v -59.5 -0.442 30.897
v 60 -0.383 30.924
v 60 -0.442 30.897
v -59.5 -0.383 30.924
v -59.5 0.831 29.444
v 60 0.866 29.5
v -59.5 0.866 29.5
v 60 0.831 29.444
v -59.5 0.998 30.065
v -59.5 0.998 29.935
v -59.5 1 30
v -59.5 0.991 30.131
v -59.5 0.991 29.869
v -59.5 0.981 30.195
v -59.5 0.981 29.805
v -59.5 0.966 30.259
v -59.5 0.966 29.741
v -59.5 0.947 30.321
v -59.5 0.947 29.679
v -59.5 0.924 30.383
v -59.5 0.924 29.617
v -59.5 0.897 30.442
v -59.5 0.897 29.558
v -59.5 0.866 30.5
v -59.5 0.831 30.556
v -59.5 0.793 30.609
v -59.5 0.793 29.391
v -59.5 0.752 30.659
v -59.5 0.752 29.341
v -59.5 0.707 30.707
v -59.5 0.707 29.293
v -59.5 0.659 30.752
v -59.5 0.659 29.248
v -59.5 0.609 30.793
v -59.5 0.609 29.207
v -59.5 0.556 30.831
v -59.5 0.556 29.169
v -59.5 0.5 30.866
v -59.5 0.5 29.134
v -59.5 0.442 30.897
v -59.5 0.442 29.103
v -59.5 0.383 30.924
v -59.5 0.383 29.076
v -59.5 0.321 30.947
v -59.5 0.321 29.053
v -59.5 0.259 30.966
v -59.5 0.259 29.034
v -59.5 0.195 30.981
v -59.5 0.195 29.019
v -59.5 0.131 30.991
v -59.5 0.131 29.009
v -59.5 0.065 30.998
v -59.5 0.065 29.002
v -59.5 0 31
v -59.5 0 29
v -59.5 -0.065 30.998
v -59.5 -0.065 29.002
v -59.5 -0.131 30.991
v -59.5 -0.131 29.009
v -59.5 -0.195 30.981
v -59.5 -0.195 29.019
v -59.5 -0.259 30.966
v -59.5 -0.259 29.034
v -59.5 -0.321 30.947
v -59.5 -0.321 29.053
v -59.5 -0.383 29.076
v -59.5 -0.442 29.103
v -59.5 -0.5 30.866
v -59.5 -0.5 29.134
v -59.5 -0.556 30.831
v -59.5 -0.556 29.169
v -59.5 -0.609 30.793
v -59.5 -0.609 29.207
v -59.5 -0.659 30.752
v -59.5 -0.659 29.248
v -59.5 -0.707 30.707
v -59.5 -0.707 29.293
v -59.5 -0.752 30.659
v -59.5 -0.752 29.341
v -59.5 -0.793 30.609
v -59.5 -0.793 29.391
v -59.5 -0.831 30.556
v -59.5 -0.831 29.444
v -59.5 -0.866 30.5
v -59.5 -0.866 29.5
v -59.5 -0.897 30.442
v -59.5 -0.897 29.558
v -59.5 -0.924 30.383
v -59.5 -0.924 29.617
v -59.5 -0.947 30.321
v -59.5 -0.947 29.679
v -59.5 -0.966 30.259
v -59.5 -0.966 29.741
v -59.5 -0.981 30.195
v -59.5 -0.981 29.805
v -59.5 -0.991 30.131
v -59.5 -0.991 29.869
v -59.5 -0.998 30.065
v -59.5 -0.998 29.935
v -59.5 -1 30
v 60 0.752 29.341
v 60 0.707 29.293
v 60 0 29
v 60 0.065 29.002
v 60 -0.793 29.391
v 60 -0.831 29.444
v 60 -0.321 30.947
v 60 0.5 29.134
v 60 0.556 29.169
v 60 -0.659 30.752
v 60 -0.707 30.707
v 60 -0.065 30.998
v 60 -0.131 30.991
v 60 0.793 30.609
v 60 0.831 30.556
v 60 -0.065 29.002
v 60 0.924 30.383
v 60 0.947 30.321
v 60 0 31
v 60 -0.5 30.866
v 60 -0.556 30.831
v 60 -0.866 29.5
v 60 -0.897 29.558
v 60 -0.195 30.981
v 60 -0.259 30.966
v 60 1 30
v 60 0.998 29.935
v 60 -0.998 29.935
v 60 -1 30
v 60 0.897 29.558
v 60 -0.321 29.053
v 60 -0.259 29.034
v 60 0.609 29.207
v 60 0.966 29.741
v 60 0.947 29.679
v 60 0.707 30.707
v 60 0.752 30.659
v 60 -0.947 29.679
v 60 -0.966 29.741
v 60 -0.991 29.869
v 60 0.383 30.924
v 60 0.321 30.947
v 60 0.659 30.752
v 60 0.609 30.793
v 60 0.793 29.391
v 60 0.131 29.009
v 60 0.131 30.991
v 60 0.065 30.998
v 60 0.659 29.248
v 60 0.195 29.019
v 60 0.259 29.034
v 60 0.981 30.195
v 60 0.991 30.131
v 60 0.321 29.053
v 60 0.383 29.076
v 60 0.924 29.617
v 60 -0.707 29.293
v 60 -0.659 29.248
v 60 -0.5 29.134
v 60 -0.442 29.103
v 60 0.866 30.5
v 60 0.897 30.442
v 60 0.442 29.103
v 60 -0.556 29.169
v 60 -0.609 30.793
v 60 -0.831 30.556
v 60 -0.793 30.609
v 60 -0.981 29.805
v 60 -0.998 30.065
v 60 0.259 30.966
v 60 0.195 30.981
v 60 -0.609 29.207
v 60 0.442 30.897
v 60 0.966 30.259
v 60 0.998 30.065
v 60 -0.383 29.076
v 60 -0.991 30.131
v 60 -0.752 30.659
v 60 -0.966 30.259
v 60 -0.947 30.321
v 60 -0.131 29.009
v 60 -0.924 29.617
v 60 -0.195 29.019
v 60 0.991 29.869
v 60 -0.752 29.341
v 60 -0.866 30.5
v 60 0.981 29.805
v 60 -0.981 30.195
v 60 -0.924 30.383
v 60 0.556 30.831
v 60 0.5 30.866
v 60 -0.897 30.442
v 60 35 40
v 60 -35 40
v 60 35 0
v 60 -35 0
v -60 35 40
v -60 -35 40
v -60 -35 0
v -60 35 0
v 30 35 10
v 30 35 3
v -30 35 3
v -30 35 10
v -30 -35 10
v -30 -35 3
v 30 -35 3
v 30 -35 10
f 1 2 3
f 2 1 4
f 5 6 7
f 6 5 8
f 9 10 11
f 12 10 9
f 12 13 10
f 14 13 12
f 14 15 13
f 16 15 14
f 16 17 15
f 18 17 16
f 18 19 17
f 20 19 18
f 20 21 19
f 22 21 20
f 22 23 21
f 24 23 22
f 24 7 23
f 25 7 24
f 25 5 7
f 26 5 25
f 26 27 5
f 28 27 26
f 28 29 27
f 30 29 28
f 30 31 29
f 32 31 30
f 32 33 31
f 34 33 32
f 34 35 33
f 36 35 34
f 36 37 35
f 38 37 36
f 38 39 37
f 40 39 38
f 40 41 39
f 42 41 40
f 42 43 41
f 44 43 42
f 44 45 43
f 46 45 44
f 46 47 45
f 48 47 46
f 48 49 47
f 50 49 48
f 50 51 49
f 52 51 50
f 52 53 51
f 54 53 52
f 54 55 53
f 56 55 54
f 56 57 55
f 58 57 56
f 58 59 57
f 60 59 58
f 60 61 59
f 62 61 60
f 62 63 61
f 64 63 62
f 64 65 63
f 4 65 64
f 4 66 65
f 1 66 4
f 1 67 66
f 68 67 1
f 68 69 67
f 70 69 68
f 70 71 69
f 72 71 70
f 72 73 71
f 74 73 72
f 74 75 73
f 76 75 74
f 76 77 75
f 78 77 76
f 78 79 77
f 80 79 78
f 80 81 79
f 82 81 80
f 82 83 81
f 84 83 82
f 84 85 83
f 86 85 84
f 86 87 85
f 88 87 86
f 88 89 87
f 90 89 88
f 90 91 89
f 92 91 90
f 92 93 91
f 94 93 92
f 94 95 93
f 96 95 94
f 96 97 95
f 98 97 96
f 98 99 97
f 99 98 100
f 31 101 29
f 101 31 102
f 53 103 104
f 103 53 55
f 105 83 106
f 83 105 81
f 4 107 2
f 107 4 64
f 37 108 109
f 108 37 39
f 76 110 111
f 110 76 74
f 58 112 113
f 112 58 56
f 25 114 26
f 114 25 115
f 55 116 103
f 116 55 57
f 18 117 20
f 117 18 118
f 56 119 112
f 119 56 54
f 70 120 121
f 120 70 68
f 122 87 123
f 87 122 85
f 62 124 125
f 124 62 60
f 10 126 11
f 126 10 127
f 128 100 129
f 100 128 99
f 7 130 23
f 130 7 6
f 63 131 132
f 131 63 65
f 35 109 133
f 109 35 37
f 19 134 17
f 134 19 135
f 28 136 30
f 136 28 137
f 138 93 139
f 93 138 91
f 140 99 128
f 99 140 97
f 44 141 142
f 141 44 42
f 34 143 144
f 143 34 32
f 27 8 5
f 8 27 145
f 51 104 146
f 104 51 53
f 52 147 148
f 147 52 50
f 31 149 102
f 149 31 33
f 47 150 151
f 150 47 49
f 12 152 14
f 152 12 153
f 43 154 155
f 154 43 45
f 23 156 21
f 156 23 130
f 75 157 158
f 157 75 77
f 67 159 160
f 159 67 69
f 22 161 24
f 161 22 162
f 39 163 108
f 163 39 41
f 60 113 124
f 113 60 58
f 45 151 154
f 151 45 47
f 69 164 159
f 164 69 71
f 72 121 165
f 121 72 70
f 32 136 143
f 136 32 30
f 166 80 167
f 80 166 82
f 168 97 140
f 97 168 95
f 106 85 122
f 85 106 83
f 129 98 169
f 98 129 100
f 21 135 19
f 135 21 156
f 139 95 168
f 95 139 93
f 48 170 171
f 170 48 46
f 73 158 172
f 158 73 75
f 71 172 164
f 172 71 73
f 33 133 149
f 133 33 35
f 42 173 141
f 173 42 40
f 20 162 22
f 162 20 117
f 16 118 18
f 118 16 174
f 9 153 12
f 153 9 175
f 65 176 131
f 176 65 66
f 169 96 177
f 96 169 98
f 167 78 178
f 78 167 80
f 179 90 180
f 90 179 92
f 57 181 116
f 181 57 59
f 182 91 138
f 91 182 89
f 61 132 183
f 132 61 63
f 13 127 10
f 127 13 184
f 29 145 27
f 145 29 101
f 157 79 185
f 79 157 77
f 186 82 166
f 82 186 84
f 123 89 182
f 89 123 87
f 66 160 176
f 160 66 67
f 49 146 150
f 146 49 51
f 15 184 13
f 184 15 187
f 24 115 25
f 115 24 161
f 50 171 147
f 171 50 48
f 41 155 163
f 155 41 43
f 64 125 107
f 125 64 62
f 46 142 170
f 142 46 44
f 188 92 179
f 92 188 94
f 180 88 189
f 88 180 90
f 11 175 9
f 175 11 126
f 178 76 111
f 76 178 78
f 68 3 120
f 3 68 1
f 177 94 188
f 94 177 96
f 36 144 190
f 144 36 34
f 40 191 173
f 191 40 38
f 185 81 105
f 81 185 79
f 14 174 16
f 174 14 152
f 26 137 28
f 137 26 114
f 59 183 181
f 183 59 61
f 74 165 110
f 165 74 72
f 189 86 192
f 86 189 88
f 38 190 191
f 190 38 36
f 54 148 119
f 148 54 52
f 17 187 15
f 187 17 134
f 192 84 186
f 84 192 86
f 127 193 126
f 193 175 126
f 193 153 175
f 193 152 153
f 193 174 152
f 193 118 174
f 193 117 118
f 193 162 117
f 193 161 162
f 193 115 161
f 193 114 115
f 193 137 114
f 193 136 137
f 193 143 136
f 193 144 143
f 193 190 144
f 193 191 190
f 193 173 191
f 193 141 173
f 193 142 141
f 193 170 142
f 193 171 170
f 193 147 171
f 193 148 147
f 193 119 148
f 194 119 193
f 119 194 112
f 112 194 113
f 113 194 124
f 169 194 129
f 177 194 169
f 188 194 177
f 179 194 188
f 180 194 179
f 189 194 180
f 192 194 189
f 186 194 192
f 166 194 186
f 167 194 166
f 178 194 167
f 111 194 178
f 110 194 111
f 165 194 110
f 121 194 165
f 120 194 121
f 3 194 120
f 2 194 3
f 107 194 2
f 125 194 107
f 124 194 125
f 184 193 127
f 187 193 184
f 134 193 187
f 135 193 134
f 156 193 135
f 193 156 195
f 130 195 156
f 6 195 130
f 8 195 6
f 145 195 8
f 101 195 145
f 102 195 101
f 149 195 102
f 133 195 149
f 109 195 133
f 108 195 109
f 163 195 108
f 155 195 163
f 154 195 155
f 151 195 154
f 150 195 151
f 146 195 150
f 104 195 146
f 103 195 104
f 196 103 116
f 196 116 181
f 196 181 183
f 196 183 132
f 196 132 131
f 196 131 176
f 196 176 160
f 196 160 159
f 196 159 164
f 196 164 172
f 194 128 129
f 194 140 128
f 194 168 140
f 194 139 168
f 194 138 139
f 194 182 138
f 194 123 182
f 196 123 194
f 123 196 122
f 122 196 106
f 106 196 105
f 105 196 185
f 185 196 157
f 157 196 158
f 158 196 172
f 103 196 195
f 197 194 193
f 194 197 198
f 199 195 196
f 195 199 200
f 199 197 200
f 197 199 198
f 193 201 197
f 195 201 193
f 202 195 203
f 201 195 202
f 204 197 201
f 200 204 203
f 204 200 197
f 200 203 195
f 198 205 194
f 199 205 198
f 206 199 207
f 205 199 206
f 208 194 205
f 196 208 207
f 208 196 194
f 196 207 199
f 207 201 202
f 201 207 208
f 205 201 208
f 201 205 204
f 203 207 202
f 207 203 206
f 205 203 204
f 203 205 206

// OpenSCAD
// Mini horizontal gel-electrophoresis box - buffer tank
// Print orientation: open top facing up, resting on XY plane at z = 0

// ---------------- Parameters ----------------
tank_x      = 120;   // outer length in X
tank_y      = 70;    // outer width in Y
tank_h      = 40;    // outer height in Z

wall        = 3;     // wall thickness
floor       = 3;     // floor thickness under tank

platform_x  = 60;    // platform length in X (centred)
platform_y  = tank_y; // platform spans full inner width
platform_top = 10;   // platform top height above tank floor (z = 13)

hole_d      = 2;     // electrode hole diameter
hole_y      = 0;     // electrode hole Y position
hole_z      = 30;    // electrode hole Z position

eps         = 0.5;   // cutter overshoot past faces

$fn = 96;

// ---------------- Derived ----------------
inner_x = tank_x - 2 * wall;   // 114 mm
inner_y = tank_y - 2 * wall;   // 64 mm
inner_z = tank_h - floor;      // 37 mm (floor under tank, open top)

platform_t = platform_top - floor;  // platform height above floor (10 mm)

// ---------------- Model ----------------
difference() {
    // Main tank body (solid, open top)
    translate([-tank_x / 2, -tank_y / 2, 0])
        cube([tank_x, tank_y, tank_h]);

    // Raised platform for gel tray, centred in X
    translate([-platform_x / 2, -platform_y / 2, floor])
        cube([platform_x, platform_y, platform_t]);

    // Horizontal electrode holes through each end wall, along X
    for (s = [-1, 1])
        translate([s > 0 ? tank_x / 2 - eps : -tank_x / 2 + eps, hole_y, hole_z])
            rotate([0, 90, 0])
                cylinder(d = hole_d, h = tank_x + 2 * eps);
}
